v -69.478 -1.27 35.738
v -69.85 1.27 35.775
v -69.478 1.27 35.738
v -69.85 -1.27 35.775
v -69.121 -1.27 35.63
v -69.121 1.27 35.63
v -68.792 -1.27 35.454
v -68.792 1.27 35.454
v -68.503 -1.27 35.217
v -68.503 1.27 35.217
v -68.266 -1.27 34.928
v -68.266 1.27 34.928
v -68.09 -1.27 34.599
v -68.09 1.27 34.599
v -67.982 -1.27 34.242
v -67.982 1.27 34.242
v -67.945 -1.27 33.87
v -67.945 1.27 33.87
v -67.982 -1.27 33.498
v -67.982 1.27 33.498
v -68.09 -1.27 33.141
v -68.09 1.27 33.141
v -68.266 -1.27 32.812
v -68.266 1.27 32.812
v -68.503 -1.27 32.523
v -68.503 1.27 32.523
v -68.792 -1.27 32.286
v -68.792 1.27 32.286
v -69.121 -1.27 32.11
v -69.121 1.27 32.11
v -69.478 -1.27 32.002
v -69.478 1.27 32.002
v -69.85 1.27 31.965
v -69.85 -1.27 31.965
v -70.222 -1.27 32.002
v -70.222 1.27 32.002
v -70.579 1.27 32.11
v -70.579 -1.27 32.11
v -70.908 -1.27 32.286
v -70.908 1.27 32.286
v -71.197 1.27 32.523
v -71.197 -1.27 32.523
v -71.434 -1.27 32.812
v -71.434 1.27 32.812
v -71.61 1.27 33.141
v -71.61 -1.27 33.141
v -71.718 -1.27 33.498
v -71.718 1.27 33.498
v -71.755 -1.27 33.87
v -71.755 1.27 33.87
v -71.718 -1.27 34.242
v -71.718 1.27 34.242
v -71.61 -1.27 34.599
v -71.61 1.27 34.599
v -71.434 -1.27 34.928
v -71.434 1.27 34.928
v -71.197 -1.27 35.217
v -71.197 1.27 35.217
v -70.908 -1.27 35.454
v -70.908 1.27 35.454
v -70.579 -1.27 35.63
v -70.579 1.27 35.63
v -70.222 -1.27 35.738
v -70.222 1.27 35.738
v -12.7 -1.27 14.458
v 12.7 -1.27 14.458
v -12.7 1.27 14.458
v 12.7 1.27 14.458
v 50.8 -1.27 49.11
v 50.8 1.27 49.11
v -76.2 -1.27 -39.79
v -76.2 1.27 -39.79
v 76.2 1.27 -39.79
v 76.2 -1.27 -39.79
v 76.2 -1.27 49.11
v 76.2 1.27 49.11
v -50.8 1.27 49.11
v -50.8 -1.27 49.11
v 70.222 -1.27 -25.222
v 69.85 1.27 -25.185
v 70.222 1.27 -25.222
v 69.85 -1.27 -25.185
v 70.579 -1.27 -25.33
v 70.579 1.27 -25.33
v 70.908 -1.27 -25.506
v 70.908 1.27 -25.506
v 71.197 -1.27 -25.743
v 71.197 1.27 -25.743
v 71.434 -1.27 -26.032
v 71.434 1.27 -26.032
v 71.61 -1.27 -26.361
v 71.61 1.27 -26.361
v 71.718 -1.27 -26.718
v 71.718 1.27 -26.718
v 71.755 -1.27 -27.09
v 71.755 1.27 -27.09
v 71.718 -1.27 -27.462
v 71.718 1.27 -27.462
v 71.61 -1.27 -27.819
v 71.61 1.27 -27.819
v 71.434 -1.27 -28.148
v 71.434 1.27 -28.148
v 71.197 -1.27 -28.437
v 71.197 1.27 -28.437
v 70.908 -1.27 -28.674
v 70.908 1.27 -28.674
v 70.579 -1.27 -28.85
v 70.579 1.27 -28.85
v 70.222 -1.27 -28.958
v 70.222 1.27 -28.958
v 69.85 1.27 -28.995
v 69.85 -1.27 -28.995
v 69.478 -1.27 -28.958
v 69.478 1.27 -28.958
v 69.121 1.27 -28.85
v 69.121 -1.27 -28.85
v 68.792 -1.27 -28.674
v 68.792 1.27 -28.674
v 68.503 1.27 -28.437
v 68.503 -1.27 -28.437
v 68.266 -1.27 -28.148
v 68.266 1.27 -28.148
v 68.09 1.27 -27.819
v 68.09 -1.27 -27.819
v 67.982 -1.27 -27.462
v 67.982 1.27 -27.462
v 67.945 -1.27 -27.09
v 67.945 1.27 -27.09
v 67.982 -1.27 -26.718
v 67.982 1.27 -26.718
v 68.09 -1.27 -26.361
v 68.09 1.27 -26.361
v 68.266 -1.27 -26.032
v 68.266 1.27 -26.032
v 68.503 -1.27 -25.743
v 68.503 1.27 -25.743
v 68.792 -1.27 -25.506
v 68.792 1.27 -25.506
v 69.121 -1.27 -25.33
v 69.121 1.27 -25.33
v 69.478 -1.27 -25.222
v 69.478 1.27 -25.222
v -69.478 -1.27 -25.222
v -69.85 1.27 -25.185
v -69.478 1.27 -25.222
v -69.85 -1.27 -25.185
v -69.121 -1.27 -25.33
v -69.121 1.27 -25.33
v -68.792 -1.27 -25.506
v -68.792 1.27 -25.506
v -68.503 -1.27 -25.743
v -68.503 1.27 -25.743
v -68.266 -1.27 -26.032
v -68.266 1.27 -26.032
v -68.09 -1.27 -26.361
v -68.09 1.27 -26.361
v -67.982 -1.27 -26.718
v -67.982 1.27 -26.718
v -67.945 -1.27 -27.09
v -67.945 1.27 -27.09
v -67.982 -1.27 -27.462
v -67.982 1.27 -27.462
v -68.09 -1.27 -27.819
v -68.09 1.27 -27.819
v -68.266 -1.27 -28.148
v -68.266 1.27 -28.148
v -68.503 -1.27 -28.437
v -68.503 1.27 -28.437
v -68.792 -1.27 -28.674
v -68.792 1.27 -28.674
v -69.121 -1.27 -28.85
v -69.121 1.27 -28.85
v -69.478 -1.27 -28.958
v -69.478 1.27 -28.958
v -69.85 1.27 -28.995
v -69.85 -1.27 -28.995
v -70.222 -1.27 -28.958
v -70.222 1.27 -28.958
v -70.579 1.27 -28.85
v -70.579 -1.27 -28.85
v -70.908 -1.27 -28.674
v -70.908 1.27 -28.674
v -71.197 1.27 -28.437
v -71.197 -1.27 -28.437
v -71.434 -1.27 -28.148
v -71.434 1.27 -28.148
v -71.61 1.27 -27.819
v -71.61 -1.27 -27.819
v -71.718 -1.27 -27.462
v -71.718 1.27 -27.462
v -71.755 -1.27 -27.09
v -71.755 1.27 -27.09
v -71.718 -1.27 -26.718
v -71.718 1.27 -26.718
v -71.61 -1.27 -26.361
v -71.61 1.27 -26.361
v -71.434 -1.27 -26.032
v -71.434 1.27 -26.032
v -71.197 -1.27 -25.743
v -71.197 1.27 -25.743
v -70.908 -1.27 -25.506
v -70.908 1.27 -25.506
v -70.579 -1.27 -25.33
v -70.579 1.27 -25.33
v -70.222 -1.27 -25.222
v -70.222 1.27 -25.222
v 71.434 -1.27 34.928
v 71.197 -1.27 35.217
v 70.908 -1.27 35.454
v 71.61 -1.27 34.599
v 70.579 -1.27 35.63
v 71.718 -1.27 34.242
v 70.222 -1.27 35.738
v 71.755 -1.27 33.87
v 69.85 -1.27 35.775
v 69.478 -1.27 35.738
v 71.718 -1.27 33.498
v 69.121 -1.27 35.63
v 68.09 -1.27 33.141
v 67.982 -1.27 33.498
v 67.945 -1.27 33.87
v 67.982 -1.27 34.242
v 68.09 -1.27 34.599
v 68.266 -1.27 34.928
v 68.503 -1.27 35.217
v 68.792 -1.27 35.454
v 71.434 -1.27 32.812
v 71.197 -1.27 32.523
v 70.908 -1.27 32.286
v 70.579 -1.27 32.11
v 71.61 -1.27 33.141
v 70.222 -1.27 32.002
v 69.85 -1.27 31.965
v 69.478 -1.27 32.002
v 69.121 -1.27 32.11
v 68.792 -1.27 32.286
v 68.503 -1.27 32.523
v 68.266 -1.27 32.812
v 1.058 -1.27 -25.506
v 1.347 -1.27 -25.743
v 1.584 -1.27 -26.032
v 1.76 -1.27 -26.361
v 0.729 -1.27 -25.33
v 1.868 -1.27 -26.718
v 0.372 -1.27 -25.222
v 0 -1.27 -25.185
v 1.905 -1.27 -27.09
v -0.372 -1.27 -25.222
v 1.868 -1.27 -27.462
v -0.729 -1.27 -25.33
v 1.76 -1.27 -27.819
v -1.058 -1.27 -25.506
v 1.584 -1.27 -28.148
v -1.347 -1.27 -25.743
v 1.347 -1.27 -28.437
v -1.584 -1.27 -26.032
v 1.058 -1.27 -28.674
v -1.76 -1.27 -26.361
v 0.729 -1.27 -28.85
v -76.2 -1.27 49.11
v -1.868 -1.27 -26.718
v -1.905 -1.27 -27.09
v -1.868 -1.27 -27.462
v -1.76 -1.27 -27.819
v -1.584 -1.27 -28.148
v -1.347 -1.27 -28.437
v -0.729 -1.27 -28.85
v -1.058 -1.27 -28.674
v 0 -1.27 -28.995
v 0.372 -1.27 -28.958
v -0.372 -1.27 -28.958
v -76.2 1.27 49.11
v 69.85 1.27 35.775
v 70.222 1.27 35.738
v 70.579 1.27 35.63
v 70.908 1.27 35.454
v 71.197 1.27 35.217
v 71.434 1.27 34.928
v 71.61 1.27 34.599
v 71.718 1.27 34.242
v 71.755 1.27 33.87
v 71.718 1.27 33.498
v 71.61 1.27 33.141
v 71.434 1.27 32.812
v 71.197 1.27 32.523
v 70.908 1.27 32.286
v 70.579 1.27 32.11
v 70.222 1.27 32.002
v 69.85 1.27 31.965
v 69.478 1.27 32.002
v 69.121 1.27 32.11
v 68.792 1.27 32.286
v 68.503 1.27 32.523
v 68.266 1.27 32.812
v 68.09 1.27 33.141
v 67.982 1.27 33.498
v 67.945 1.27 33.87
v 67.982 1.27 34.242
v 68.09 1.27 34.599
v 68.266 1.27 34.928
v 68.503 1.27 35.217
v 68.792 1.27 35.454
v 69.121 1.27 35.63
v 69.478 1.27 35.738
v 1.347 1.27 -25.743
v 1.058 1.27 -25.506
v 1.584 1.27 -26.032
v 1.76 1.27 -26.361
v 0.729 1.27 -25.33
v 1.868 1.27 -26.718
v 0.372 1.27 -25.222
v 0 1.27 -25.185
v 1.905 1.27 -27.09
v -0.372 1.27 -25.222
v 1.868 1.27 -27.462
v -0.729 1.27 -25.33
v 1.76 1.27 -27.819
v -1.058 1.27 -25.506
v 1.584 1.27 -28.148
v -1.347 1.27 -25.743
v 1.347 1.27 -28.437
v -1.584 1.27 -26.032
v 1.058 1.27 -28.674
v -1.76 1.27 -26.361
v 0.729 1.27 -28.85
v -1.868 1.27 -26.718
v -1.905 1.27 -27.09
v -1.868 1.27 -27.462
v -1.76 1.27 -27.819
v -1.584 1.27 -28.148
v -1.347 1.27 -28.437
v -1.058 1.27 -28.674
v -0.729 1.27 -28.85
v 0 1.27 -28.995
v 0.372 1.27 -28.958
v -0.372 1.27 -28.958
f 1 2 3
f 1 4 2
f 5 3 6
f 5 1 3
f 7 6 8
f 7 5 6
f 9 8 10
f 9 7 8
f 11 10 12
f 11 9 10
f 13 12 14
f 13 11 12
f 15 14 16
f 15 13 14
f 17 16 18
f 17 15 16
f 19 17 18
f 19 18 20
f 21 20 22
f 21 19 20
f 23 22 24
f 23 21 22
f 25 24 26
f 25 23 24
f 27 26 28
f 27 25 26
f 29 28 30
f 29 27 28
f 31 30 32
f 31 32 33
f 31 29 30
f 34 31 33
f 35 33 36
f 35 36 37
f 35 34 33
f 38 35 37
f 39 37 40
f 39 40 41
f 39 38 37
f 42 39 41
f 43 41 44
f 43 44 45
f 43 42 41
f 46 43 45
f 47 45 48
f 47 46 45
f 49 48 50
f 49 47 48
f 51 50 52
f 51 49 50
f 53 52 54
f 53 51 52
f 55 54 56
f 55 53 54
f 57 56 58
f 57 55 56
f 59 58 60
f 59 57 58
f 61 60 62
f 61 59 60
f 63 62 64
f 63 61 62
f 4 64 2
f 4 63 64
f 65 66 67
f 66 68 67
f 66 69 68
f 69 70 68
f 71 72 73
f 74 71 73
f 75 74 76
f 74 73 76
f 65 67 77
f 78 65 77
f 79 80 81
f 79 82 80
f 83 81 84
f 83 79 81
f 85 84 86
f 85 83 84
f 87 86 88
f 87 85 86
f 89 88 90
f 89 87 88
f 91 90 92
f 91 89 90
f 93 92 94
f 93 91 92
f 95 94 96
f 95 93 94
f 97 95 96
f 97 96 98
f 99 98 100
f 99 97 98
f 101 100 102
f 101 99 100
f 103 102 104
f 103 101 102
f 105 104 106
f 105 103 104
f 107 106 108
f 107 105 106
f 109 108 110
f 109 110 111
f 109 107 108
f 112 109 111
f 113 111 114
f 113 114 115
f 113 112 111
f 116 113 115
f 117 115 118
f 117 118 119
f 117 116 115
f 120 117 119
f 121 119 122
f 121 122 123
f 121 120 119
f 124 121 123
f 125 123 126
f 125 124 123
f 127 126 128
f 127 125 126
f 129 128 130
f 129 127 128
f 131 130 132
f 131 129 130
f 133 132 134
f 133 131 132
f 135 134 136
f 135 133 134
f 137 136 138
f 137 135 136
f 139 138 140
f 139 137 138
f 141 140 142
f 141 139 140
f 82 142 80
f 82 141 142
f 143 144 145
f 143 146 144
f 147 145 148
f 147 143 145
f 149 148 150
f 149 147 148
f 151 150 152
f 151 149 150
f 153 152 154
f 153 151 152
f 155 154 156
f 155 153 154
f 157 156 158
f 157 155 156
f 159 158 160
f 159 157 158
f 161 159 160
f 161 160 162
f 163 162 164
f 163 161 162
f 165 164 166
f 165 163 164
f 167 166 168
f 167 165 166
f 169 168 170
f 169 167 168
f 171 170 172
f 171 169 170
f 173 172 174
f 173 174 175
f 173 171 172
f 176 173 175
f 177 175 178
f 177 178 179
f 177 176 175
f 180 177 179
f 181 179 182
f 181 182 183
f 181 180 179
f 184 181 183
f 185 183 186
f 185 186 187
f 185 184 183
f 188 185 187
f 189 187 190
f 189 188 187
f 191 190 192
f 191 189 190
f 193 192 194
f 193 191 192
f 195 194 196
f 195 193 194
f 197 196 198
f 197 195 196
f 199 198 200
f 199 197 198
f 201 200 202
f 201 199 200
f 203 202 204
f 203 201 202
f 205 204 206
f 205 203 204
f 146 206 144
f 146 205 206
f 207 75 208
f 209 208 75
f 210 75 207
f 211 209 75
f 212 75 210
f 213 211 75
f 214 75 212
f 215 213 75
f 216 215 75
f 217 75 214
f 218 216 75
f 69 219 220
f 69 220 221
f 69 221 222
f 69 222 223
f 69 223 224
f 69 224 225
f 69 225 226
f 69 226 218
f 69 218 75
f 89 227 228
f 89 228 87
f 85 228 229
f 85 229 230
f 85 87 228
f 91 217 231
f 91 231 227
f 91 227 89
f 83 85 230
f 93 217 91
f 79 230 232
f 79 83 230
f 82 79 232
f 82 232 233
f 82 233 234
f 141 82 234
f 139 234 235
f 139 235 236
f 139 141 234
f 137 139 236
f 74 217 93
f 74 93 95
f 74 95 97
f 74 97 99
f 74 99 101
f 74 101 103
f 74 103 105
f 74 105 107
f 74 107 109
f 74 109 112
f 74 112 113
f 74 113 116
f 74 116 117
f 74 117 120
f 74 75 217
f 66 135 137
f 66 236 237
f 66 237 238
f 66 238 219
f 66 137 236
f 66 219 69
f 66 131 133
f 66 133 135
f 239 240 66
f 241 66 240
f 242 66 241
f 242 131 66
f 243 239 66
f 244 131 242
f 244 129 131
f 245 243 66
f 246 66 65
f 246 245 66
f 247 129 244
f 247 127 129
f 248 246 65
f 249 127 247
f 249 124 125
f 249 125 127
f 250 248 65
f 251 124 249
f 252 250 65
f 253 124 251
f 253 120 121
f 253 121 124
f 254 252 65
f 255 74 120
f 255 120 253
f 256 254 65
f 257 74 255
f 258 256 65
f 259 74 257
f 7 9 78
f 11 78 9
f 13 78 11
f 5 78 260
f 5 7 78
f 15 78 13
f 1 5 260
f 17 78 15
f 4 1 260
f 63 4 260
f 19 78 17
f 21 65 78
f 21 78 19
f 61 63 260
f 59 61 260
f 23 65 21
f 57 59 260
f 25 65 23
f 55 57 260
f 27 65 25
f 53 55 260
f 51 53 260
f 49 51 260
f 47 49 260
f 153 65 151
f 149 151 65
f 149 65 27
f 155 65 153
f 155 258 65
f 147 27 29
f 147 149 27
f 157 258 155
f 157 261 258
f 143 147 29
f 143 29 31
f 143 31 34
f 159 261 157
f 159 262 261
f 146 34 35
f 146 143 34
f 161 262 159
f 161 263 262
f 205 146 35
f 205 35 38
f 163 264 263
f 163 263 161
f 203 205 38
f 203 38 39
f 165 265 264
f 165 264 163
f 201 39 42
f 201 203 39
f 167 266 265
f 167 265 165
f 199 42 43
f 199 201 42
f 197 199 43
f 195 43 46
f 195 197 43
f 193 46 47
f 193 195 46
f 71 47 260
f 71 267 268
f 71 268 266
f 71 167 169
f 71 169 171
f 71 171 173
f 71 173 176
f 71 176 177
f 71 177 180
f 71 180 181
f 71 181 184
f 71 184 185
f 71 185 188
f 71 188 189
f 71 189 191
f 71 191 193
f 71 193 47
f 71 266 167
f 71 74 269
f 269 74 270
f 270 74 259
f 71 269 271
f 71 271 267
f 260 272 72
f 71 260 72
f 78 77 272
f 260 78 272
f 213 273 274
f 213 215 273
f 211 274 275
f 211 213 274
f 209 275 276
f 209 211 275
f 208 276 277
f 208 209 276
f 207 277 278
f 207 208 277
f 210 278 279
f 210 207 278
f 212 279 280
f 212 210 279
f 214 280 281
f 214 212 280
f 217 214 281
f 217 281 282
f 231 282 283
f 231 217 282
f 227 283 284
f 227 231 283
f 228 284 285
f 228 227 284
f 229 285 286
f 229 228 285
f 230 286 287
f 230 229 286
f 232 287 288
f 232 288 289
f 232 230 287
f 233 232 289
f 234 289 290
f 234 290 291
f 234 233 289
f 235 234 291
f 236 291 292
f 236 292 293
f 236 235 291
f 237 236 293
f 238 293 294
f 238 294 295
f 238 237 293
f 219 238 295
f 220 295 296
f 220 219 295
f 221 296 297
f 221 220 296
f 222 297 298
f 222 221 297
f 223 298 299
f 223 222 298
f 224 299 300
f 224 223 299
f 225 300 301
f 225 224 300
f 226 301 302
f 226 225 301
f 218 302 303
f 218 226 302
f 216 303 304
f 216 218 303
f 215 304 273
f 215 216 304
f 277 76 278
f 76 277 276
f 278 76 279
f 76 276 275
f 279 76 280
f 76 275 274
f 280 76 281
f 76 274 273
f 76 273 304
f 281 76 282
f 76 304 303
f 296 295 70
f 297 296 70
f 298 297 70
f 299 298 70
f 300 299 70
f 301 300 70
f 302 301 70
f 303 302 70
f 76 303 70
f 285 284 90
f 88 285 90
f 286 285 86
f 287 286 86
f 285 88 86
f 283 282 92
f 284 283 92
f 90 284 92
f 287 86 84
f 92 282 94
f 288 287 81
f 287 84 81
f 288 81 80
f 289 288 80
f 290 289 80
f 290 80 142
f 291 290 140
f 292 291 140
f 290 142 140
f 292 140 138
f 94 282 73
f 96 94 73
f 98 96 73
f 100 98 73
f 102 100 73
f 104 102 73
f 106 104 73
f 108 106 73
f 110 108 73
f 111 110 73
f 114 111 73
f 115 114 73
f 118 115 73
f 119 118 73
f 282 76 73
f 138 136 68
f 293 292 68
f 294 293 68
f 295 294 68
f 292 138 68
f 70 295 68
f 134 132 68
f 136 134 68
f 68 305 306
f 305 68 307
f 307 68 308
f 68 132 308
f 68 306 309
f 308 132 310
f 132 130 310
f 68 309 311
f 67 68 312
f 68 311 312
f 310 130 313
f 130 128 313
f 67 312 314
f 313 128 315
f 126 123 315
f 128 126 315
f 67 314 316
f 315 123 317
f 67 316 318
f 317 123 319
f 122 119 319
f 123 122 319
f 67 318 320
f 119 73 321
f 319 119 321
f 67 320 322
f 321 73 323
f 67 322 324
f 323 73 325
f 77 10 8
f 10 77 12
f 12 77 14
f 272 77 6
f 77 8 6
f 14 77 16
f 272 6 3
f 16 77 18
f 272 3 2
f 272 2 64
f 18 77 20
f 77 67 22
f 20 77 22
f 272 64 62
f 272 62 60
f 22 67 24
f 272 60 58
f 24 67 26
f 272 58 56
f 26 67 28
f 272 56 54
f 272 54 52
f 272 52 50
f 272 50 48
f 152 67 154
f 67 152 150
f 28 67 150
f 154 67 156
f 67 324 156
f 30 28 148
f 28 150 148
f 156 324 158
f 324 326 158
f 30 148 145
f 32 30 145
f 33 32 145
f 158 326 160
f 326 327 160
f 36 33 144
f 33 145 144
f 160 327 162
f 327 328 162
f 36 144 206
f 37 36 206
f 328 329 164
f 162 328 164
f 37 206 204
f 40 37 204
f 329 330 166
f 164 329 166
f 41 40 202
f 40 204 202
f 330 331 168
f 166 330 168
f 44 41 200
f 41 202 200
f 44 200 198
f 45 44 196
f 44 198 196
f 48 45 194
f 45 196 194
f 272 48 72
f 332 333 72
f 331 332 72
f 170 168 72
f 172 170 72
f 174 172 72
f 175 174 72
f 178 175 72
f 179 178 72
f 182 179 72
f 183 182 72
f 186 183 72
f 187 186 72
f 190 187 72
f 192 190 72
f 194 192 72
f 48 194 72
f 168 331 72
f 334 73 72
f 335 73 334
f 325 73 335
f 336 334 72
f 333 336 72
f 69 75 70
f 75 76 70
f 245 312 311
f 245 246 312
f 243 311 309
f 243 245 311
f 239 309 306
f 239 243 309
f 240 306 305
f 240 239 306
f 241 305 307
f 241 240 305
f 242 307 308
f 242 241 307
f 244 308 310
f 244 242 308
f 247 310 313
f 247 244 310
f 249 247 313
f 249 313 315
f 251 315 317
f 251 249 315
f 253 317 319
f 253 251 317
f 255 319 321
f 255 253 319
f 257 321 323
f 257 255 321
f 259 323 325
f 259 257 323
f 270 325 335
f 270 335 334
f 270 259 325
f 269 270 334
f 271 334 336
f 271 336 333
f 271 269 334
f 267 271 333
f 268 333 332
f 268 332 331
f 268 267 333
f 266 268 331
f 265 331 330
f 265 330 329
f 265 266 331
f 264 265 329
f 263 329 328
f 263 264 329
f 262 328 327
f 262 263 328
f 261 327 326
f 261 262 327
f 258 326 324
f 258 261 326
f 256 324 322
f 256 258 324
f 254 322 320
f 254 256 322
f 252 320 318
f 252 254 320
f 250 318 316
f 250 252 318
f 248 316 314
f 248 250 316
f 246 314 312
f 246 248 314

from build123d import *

# Parameters (mm, degrees)
SKETCH1_R           = 1.905
BOSS_EXTRUDE1_DEPTH = 1.27


with BuildPart() as part:
    # Sketch1 → Boss-Extrude1 (new, symmetric)
    with BuildSketch(Plane(origin=(0, 0, 0), x_dir=(1, 0, 0), z_dir=(0, 1, 0))):
        Polygon((-76.2, 39.789919355), (76.2, 39.789919355), (76.2, -49.110080645), (50.8, -49.110080645), (12.7, -14.458198925), (-12.7, -14.458198925), (-50.8, -49.110080645), (-76.2, -49.110080645), align=None)
        with Locations(Location((69.85, 27.089919355, 0), (0, 0, 270))):
            Circle(SKETCH1_R, mode=Mode.SUBTRACT)
        with Locations(Location((0, 27.089919355, 0), (0, 0, 270))):
            Circle(SKETCH1_R, mode=Mode.SUBTRACT)
        with Locations(Location((-69.85, 27.089919355, 0), (0, 0, 270))):
            Circle(SKETCH1_R, mode=Mode.SUBTRACT)
        with Locations(Location((69.85, -33.870080645, 0), (0, 0, 270))):
            Circle(SKETCH1_R, mode=Mode.SUBTRACT)
        with Locations(Location((-69.85, -33.870080645, 0), (0, 0, 270))):
            Circle(SKETCH1_R, mode=Mode.SUBTRACT)
    extrude(amount=BOSS_EXTRUDE1_DEPTH, both=True)


solid = part.part
